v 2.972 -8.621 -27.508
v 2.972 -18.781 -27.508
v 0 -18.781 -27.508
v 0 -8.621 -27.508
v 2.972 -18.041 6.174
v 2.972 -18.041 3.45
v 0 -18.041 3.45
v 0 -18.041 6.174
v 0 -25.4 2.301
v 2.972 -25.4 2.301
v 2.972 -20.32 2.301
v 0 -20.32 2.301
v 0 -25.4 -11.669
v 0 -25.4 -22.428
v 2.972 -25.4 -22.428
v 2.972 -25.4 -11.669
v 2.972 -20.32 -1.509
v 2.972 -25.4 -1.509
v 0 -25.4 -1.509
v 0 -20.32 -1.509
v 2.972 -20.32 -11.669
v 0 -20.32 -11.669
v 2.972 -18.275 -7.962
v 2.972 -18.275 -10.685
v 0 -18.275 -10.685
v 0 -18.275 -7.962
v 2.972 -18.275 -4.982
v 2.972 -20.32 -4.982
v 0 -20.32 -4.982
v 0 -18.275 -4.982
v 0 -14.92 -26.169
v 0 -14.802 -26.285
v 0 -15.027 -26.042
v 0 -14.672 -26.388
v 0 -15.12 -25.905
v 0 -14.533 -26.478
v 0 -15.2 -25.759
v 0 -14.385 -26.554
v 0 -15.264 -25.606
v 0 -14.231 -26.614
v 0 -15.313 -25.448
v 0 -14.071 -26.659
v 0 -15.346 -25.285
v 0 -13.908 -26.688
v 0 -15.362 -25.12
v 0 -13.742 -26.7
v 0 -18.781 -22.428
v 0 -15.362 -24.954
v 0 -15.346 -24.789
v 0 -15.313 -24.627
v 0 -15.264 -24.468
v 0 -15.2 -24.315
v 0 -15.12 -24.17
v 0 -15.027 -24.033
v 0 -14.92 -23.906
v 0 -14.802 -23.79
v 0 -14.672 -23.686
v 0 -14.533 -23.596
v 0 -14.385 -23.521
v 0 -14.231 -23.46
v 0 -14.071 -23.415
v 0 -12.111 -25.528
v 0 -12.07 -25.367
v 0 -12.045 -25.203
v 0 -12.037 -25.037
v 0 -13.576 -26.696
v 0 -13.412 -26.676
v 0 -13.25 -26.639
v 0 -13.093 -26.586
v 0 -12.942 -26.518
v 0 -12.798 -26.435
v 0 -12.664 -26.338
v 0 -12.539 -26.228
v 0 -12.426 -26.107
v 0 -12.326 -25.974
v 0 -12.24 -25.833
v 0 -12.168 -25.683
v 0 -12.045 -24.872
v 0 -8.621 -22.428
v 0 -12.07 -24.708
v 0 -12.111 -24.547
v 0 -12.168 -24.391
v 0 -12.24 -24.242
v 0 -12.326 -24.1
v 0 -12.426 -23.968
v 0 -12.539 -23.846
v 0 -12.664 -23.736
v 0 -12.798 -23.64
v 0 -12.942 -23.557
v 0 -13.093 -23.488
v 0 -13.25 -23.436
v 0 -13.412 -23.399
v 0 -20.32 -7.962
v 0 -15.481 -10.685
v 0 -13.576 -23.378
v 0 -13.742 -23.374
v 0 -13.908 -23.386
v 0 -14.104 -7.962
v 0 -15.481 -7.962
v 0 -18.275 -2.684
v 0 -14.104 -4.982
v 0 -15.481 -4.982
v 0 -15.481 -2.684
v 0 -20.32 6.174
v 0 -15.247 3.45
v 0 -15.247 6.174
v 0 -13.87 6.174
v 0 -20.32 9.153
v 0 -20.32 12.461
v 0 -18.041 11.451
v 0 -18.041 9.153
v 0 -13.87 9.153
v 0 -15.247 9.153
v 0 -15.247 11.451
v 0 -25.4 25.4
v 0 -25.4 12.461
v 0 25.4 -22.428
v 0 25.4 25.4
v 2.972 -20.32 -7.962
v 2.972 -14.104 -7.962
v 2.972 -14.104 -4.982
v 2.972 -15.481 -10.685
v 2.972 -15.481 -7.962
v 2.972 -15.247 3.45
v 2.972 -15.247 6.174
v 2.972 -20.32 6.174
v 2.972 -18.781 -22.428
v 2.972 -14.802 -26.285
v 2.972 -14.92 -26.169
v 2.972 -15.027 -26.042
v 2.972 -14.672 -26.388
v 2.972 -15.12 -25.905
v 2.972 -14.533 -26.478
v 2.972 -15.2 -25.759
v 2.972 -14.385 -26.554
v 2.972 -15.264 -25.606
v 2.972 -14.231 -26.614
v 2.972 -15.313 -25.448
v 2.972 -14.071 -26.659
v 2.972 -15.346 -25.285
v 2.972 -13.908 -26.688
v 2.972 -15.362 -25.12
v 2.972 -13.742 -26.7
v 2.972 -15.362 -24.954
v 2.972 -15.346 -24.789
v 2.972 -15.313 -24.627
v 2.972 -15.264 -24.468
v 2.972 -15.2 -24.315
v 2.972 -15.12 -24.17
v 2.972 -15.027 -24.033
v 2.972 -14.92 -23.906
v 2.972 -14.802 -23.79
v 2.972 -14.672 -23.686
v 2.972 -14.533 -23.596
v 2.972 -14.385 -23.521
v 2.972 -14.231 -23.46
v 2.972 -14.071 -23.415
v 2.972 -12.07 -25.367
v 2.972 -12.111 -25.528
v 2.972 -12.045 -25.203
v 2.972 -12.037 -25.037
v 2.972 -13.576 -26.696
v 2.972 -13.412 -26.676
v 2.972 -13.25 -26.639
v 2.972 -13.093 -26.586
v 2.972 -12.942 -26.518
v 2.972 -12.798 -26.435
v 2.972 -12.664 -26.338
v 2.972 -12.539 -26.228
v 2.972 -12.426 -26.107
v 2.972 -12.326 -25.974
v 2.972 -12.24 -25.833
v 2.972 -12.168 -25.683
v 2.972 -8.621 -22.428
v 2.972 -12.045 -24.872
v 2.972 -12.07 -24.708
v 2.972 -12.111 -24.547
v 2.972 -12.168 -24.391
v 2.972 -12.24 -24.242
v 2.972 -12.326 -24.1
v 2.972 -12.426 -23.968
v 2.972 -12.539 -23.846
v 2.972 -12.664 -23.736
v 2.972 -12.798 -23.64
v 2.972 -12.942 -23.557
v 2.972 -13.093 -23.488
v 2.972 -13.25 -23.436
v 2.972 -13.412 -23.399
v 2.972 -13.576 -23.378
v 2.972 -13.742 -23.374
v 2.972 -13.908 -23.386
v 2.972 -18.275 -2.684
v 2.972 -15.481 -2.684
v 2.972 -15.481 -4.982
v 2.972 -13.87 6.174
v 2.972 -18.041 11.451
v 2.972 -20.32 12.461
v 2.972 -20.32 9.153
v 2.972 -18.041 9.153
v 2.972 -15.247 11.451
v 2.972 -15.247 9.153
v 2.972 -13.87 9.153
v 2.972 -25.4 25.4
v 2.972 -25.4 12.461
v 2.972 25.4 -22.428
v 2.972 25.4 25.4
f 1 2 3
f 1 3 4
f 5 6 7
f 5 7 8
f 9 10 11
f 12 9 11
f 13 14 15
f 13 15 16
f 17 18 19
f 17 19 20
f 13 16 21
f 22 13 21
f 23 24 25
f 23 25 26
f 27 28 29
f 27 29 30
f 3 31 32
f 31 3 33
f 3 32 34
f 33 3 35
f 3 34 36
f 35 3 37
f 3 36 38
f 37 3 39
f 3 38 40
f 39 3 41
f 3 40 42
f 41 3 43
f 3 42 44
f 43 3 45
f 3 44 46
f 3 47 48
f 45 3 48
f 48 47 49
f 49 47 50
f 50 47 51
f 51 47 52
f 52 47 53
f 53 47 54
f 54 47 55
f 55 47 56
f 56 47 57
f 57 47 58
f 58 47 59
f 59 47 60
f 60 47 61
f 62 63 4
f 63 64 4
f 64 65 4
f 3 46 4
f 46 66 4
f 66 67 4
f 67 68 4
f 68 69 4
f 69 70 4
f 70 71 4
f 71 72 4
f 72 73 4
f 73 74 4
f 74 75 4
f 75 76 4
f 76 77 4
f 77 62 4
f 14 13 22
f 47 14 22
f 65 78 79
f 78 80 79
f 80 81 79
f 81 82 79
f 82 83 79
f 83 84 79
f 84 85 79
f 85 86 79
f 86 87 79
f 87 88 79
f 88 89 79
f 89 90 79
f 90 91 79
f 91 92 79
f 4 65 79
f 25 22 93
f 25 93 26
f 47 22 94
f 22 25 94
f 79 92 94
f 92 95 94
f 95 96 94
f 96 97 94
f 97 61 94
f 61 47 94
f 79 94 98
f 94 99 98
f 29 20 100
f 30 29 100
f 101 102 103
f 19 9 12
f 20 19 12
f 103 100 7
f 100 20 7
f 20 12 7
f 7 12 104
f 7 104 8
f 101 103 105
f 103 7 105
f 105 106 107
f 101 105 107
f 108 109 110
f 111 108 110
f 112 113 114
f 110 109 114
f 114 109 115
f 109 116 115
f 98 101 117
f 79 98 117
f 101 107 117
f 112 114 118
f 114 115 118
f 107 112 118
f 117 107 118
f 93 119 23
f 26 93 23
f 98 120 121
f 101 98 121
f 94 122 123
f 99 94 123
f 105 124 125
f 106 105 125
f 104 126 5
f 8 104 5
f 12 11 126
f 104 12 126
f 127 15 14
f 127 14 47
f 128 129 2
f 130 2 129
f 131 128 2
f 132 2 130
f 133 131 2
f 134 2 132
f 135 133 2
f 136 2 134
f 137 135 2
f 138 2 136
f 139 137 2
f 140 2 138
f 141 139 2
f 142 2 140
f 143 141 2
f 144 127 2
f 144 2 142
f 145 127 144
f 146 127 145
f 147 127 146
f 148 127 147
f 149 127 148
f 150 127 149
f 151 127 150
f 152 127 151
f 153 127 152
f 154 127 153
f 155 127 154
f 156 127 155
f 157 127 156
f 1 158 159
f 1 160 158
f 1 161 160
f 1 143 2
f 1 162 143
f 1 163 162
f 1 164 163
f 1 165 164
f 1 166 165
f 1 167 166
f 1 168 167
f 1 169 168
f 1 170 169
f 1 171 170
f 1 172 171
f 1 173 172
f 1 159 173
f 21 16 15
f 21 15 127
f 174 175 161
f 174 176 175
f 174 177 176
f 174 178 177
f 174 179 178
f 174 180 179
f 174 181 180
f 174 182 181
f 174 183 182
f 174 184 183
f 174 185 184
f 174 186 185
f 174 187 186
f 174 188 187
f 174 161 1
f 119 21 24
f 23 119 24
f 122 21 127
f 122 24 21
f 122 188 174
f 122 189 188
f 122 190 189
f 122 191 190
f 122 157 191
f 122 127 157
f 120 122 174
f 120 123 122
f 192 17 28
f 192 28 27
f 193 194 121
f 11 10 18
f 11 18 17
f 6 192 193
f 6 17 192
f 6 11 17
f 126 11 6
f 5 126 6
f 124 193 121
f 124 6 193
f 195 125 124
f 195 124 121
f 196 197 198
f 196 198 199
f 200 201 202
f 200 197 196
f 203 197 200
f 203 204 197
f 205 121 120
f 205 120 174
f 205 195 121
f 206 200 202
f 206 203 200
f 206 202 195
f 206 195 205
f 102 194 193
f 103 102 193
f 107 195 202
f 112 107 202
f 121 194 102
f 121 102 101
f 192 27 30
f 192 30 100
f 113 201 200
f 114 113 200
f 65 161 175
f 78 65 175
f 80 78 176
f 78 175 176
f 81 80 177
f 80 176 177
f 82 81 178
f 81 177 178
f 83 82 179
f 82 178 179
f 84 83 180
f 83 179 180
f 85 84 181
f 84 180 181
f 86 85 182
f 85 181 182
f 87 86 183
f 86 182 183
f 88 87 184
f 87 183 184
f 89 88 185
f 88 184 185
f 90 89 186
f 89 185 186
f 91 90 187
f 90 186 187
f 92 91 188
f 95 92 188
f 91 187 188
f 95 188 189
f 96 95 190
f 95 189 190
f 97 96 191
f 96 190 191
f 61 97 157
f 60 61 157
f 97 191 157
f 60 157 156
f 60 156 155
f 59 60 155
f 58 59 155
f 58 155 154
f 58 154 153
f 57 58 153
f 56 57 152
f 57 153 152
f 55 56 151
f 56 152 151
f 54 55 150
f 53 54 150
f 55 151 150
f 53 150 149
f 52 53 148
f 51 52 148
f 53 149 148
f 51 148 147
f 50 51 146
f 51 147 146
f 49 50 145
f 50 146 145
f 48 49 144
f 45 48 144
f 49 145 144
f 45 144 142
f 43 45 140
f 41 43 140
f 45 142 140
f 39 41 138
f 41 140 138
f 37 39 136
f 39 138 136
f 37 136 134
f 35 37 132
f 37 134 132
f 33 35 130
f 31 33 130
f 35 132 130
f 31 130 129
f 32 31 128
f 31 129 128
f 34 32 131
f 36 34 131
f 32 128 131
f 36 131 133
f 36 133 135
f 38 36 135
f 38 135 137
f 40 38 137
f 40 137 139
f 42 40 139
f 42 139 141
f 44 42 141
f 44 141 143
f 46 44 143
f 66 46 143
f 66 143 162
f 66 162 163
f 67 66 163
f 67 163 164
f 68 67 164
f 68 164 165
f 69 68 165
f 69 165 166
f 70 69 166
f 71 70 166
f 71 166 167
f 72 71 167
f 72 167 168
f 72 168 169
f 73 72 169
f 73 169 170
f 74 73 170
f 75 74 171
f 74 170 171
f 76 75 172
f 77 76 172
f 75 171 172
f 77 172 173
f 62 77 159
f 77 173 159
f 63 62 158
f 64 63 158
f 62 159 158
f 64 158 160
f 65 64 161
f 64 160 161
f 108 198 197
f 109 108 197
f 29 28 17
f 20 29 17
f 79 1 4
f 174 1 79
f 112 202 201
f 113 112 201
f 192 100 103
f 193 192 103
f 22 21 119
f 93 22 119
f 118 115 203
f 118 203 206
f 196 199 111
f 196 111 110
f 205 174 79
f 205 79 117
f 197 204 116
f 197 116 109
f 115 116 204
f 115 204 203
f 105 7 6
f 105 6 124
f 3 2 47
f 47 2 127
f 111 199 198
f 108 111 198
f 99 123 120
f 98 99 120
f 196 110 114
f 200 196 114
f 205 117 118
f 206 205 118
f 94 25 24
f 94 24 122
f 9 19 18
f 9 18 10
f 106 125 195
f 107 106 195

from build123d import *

# Parameters (mm, degrees)
F0_W     = 50.8
F0_H     = 50.8
F1_DEPTH = 2.9718
F2_W     = 5.08
F2_H     = 10.16
F3_DEPTH = 2.9728
F4_W     = 2.2792507852
F4_H     = 2.9790955722
F4_W_2   = 2.794
F4_W_3   = 1.3767347039
F4_H_2   = 2.2981600394
F4_H_3   = 2.7237443884
F4_W_4   = 2.0448682842
F5_DEPTH = 2.9728
F6_W     = 50.8
F6_H     = 2.9718
F7_DEPTH = 25.4
F8_W     = 10.16
F8_H     = 5.08
F8_R     = 1.6637
F9_DEPTH = 2.9718


with BuildPart() as f1:
    # F0 (on Right) → F1 (new body)
    with BuildSketch(Plane.YZ):
        Rectangle(F0_W, F0_H)
    extrude(amount=F1_DEPTH)

    # F2 (on face) → F3 (cut, through all)
    with BuildSketch(Plane.YZ.offset(2.9718)):
        with Locations((-22.86, 7.3814073086)):
            Rectangle(F2_W, F2_H)
        with Locations((-22.86, -6.5885926914)):
            Rectangle(F2_W, F2_H)
    extrude(amount=-F3_DEPTH, mode=Mode.SUBTRACT)

    # F4 (on face) → F5 (cut, through all)
    with BuildSketch(Plane.YZ.offset(2.9718)):
        with Locations((-19.1803746074, 7.6630806953)):
            Rectangle(F4_W, F4_H)
        with Locations((-16.6437492148, 7.6630806953)):
            Rectangle(F4_W_2, F4_H)
        with Locations((-14.5583818629, 7.6630806953)):
            Rectangle(F4_W_3, F4_H)
        with Locations((-16.6437492148, 10.3017085011)):
            Rectangle(F4_W_2, F4_H_2)
        with Locations((-16.6437492148, 4.811660715)):
            Rectangle(F4_W_2, F4_H_3)
        with Locations((-16.8781317158, -3.8333461044)):
            Rectangle(F4_W_2, F4_H_2)
        with Locations((-19.2975658579, -6.4719739102)):
            Rectangle(F4_W_4, F4_H)
        with Locations((-14.7927643638, -6.4719739102)):
            Rectangle(F4_W_3, F4_H)
        with Locations((-16.8781317158, -6.4719739102)):
            Rectangle(F4_W_2, F4_H)
        with Locations((-16.8781317158, -9.3233938905)):
            Rectangle(F4_W_2, F4_H_3)
    extrude(amount=-F5_DEPTH, mode=Mode.SUBTRACT)

    # F6 (on face) → F7 (cut)
    with BuildSketch(Plane.YZ.offset(2.9718)):
        with Locations((0, -23.9141)):
            Rectangle(F6_W, F6_H)
    extrude(amount=-F7_DEPTH, mode=Mode.SUBTRACT)

    # F8 (on face) → F9 (join)
    with BuildSketch(Plane.YZ.offset(2.9718)):
        with Locations((-13.7008163464, -24.9682)):
            Rectangle(F8_W, F8_H)
        with Locations((-13.7008163464, -25.0371717972)):
            Circle(F8_R, mode=Mode.SUBTRACT)
    extrude(amount=-F9_DEPTH)


solid = f1.part
